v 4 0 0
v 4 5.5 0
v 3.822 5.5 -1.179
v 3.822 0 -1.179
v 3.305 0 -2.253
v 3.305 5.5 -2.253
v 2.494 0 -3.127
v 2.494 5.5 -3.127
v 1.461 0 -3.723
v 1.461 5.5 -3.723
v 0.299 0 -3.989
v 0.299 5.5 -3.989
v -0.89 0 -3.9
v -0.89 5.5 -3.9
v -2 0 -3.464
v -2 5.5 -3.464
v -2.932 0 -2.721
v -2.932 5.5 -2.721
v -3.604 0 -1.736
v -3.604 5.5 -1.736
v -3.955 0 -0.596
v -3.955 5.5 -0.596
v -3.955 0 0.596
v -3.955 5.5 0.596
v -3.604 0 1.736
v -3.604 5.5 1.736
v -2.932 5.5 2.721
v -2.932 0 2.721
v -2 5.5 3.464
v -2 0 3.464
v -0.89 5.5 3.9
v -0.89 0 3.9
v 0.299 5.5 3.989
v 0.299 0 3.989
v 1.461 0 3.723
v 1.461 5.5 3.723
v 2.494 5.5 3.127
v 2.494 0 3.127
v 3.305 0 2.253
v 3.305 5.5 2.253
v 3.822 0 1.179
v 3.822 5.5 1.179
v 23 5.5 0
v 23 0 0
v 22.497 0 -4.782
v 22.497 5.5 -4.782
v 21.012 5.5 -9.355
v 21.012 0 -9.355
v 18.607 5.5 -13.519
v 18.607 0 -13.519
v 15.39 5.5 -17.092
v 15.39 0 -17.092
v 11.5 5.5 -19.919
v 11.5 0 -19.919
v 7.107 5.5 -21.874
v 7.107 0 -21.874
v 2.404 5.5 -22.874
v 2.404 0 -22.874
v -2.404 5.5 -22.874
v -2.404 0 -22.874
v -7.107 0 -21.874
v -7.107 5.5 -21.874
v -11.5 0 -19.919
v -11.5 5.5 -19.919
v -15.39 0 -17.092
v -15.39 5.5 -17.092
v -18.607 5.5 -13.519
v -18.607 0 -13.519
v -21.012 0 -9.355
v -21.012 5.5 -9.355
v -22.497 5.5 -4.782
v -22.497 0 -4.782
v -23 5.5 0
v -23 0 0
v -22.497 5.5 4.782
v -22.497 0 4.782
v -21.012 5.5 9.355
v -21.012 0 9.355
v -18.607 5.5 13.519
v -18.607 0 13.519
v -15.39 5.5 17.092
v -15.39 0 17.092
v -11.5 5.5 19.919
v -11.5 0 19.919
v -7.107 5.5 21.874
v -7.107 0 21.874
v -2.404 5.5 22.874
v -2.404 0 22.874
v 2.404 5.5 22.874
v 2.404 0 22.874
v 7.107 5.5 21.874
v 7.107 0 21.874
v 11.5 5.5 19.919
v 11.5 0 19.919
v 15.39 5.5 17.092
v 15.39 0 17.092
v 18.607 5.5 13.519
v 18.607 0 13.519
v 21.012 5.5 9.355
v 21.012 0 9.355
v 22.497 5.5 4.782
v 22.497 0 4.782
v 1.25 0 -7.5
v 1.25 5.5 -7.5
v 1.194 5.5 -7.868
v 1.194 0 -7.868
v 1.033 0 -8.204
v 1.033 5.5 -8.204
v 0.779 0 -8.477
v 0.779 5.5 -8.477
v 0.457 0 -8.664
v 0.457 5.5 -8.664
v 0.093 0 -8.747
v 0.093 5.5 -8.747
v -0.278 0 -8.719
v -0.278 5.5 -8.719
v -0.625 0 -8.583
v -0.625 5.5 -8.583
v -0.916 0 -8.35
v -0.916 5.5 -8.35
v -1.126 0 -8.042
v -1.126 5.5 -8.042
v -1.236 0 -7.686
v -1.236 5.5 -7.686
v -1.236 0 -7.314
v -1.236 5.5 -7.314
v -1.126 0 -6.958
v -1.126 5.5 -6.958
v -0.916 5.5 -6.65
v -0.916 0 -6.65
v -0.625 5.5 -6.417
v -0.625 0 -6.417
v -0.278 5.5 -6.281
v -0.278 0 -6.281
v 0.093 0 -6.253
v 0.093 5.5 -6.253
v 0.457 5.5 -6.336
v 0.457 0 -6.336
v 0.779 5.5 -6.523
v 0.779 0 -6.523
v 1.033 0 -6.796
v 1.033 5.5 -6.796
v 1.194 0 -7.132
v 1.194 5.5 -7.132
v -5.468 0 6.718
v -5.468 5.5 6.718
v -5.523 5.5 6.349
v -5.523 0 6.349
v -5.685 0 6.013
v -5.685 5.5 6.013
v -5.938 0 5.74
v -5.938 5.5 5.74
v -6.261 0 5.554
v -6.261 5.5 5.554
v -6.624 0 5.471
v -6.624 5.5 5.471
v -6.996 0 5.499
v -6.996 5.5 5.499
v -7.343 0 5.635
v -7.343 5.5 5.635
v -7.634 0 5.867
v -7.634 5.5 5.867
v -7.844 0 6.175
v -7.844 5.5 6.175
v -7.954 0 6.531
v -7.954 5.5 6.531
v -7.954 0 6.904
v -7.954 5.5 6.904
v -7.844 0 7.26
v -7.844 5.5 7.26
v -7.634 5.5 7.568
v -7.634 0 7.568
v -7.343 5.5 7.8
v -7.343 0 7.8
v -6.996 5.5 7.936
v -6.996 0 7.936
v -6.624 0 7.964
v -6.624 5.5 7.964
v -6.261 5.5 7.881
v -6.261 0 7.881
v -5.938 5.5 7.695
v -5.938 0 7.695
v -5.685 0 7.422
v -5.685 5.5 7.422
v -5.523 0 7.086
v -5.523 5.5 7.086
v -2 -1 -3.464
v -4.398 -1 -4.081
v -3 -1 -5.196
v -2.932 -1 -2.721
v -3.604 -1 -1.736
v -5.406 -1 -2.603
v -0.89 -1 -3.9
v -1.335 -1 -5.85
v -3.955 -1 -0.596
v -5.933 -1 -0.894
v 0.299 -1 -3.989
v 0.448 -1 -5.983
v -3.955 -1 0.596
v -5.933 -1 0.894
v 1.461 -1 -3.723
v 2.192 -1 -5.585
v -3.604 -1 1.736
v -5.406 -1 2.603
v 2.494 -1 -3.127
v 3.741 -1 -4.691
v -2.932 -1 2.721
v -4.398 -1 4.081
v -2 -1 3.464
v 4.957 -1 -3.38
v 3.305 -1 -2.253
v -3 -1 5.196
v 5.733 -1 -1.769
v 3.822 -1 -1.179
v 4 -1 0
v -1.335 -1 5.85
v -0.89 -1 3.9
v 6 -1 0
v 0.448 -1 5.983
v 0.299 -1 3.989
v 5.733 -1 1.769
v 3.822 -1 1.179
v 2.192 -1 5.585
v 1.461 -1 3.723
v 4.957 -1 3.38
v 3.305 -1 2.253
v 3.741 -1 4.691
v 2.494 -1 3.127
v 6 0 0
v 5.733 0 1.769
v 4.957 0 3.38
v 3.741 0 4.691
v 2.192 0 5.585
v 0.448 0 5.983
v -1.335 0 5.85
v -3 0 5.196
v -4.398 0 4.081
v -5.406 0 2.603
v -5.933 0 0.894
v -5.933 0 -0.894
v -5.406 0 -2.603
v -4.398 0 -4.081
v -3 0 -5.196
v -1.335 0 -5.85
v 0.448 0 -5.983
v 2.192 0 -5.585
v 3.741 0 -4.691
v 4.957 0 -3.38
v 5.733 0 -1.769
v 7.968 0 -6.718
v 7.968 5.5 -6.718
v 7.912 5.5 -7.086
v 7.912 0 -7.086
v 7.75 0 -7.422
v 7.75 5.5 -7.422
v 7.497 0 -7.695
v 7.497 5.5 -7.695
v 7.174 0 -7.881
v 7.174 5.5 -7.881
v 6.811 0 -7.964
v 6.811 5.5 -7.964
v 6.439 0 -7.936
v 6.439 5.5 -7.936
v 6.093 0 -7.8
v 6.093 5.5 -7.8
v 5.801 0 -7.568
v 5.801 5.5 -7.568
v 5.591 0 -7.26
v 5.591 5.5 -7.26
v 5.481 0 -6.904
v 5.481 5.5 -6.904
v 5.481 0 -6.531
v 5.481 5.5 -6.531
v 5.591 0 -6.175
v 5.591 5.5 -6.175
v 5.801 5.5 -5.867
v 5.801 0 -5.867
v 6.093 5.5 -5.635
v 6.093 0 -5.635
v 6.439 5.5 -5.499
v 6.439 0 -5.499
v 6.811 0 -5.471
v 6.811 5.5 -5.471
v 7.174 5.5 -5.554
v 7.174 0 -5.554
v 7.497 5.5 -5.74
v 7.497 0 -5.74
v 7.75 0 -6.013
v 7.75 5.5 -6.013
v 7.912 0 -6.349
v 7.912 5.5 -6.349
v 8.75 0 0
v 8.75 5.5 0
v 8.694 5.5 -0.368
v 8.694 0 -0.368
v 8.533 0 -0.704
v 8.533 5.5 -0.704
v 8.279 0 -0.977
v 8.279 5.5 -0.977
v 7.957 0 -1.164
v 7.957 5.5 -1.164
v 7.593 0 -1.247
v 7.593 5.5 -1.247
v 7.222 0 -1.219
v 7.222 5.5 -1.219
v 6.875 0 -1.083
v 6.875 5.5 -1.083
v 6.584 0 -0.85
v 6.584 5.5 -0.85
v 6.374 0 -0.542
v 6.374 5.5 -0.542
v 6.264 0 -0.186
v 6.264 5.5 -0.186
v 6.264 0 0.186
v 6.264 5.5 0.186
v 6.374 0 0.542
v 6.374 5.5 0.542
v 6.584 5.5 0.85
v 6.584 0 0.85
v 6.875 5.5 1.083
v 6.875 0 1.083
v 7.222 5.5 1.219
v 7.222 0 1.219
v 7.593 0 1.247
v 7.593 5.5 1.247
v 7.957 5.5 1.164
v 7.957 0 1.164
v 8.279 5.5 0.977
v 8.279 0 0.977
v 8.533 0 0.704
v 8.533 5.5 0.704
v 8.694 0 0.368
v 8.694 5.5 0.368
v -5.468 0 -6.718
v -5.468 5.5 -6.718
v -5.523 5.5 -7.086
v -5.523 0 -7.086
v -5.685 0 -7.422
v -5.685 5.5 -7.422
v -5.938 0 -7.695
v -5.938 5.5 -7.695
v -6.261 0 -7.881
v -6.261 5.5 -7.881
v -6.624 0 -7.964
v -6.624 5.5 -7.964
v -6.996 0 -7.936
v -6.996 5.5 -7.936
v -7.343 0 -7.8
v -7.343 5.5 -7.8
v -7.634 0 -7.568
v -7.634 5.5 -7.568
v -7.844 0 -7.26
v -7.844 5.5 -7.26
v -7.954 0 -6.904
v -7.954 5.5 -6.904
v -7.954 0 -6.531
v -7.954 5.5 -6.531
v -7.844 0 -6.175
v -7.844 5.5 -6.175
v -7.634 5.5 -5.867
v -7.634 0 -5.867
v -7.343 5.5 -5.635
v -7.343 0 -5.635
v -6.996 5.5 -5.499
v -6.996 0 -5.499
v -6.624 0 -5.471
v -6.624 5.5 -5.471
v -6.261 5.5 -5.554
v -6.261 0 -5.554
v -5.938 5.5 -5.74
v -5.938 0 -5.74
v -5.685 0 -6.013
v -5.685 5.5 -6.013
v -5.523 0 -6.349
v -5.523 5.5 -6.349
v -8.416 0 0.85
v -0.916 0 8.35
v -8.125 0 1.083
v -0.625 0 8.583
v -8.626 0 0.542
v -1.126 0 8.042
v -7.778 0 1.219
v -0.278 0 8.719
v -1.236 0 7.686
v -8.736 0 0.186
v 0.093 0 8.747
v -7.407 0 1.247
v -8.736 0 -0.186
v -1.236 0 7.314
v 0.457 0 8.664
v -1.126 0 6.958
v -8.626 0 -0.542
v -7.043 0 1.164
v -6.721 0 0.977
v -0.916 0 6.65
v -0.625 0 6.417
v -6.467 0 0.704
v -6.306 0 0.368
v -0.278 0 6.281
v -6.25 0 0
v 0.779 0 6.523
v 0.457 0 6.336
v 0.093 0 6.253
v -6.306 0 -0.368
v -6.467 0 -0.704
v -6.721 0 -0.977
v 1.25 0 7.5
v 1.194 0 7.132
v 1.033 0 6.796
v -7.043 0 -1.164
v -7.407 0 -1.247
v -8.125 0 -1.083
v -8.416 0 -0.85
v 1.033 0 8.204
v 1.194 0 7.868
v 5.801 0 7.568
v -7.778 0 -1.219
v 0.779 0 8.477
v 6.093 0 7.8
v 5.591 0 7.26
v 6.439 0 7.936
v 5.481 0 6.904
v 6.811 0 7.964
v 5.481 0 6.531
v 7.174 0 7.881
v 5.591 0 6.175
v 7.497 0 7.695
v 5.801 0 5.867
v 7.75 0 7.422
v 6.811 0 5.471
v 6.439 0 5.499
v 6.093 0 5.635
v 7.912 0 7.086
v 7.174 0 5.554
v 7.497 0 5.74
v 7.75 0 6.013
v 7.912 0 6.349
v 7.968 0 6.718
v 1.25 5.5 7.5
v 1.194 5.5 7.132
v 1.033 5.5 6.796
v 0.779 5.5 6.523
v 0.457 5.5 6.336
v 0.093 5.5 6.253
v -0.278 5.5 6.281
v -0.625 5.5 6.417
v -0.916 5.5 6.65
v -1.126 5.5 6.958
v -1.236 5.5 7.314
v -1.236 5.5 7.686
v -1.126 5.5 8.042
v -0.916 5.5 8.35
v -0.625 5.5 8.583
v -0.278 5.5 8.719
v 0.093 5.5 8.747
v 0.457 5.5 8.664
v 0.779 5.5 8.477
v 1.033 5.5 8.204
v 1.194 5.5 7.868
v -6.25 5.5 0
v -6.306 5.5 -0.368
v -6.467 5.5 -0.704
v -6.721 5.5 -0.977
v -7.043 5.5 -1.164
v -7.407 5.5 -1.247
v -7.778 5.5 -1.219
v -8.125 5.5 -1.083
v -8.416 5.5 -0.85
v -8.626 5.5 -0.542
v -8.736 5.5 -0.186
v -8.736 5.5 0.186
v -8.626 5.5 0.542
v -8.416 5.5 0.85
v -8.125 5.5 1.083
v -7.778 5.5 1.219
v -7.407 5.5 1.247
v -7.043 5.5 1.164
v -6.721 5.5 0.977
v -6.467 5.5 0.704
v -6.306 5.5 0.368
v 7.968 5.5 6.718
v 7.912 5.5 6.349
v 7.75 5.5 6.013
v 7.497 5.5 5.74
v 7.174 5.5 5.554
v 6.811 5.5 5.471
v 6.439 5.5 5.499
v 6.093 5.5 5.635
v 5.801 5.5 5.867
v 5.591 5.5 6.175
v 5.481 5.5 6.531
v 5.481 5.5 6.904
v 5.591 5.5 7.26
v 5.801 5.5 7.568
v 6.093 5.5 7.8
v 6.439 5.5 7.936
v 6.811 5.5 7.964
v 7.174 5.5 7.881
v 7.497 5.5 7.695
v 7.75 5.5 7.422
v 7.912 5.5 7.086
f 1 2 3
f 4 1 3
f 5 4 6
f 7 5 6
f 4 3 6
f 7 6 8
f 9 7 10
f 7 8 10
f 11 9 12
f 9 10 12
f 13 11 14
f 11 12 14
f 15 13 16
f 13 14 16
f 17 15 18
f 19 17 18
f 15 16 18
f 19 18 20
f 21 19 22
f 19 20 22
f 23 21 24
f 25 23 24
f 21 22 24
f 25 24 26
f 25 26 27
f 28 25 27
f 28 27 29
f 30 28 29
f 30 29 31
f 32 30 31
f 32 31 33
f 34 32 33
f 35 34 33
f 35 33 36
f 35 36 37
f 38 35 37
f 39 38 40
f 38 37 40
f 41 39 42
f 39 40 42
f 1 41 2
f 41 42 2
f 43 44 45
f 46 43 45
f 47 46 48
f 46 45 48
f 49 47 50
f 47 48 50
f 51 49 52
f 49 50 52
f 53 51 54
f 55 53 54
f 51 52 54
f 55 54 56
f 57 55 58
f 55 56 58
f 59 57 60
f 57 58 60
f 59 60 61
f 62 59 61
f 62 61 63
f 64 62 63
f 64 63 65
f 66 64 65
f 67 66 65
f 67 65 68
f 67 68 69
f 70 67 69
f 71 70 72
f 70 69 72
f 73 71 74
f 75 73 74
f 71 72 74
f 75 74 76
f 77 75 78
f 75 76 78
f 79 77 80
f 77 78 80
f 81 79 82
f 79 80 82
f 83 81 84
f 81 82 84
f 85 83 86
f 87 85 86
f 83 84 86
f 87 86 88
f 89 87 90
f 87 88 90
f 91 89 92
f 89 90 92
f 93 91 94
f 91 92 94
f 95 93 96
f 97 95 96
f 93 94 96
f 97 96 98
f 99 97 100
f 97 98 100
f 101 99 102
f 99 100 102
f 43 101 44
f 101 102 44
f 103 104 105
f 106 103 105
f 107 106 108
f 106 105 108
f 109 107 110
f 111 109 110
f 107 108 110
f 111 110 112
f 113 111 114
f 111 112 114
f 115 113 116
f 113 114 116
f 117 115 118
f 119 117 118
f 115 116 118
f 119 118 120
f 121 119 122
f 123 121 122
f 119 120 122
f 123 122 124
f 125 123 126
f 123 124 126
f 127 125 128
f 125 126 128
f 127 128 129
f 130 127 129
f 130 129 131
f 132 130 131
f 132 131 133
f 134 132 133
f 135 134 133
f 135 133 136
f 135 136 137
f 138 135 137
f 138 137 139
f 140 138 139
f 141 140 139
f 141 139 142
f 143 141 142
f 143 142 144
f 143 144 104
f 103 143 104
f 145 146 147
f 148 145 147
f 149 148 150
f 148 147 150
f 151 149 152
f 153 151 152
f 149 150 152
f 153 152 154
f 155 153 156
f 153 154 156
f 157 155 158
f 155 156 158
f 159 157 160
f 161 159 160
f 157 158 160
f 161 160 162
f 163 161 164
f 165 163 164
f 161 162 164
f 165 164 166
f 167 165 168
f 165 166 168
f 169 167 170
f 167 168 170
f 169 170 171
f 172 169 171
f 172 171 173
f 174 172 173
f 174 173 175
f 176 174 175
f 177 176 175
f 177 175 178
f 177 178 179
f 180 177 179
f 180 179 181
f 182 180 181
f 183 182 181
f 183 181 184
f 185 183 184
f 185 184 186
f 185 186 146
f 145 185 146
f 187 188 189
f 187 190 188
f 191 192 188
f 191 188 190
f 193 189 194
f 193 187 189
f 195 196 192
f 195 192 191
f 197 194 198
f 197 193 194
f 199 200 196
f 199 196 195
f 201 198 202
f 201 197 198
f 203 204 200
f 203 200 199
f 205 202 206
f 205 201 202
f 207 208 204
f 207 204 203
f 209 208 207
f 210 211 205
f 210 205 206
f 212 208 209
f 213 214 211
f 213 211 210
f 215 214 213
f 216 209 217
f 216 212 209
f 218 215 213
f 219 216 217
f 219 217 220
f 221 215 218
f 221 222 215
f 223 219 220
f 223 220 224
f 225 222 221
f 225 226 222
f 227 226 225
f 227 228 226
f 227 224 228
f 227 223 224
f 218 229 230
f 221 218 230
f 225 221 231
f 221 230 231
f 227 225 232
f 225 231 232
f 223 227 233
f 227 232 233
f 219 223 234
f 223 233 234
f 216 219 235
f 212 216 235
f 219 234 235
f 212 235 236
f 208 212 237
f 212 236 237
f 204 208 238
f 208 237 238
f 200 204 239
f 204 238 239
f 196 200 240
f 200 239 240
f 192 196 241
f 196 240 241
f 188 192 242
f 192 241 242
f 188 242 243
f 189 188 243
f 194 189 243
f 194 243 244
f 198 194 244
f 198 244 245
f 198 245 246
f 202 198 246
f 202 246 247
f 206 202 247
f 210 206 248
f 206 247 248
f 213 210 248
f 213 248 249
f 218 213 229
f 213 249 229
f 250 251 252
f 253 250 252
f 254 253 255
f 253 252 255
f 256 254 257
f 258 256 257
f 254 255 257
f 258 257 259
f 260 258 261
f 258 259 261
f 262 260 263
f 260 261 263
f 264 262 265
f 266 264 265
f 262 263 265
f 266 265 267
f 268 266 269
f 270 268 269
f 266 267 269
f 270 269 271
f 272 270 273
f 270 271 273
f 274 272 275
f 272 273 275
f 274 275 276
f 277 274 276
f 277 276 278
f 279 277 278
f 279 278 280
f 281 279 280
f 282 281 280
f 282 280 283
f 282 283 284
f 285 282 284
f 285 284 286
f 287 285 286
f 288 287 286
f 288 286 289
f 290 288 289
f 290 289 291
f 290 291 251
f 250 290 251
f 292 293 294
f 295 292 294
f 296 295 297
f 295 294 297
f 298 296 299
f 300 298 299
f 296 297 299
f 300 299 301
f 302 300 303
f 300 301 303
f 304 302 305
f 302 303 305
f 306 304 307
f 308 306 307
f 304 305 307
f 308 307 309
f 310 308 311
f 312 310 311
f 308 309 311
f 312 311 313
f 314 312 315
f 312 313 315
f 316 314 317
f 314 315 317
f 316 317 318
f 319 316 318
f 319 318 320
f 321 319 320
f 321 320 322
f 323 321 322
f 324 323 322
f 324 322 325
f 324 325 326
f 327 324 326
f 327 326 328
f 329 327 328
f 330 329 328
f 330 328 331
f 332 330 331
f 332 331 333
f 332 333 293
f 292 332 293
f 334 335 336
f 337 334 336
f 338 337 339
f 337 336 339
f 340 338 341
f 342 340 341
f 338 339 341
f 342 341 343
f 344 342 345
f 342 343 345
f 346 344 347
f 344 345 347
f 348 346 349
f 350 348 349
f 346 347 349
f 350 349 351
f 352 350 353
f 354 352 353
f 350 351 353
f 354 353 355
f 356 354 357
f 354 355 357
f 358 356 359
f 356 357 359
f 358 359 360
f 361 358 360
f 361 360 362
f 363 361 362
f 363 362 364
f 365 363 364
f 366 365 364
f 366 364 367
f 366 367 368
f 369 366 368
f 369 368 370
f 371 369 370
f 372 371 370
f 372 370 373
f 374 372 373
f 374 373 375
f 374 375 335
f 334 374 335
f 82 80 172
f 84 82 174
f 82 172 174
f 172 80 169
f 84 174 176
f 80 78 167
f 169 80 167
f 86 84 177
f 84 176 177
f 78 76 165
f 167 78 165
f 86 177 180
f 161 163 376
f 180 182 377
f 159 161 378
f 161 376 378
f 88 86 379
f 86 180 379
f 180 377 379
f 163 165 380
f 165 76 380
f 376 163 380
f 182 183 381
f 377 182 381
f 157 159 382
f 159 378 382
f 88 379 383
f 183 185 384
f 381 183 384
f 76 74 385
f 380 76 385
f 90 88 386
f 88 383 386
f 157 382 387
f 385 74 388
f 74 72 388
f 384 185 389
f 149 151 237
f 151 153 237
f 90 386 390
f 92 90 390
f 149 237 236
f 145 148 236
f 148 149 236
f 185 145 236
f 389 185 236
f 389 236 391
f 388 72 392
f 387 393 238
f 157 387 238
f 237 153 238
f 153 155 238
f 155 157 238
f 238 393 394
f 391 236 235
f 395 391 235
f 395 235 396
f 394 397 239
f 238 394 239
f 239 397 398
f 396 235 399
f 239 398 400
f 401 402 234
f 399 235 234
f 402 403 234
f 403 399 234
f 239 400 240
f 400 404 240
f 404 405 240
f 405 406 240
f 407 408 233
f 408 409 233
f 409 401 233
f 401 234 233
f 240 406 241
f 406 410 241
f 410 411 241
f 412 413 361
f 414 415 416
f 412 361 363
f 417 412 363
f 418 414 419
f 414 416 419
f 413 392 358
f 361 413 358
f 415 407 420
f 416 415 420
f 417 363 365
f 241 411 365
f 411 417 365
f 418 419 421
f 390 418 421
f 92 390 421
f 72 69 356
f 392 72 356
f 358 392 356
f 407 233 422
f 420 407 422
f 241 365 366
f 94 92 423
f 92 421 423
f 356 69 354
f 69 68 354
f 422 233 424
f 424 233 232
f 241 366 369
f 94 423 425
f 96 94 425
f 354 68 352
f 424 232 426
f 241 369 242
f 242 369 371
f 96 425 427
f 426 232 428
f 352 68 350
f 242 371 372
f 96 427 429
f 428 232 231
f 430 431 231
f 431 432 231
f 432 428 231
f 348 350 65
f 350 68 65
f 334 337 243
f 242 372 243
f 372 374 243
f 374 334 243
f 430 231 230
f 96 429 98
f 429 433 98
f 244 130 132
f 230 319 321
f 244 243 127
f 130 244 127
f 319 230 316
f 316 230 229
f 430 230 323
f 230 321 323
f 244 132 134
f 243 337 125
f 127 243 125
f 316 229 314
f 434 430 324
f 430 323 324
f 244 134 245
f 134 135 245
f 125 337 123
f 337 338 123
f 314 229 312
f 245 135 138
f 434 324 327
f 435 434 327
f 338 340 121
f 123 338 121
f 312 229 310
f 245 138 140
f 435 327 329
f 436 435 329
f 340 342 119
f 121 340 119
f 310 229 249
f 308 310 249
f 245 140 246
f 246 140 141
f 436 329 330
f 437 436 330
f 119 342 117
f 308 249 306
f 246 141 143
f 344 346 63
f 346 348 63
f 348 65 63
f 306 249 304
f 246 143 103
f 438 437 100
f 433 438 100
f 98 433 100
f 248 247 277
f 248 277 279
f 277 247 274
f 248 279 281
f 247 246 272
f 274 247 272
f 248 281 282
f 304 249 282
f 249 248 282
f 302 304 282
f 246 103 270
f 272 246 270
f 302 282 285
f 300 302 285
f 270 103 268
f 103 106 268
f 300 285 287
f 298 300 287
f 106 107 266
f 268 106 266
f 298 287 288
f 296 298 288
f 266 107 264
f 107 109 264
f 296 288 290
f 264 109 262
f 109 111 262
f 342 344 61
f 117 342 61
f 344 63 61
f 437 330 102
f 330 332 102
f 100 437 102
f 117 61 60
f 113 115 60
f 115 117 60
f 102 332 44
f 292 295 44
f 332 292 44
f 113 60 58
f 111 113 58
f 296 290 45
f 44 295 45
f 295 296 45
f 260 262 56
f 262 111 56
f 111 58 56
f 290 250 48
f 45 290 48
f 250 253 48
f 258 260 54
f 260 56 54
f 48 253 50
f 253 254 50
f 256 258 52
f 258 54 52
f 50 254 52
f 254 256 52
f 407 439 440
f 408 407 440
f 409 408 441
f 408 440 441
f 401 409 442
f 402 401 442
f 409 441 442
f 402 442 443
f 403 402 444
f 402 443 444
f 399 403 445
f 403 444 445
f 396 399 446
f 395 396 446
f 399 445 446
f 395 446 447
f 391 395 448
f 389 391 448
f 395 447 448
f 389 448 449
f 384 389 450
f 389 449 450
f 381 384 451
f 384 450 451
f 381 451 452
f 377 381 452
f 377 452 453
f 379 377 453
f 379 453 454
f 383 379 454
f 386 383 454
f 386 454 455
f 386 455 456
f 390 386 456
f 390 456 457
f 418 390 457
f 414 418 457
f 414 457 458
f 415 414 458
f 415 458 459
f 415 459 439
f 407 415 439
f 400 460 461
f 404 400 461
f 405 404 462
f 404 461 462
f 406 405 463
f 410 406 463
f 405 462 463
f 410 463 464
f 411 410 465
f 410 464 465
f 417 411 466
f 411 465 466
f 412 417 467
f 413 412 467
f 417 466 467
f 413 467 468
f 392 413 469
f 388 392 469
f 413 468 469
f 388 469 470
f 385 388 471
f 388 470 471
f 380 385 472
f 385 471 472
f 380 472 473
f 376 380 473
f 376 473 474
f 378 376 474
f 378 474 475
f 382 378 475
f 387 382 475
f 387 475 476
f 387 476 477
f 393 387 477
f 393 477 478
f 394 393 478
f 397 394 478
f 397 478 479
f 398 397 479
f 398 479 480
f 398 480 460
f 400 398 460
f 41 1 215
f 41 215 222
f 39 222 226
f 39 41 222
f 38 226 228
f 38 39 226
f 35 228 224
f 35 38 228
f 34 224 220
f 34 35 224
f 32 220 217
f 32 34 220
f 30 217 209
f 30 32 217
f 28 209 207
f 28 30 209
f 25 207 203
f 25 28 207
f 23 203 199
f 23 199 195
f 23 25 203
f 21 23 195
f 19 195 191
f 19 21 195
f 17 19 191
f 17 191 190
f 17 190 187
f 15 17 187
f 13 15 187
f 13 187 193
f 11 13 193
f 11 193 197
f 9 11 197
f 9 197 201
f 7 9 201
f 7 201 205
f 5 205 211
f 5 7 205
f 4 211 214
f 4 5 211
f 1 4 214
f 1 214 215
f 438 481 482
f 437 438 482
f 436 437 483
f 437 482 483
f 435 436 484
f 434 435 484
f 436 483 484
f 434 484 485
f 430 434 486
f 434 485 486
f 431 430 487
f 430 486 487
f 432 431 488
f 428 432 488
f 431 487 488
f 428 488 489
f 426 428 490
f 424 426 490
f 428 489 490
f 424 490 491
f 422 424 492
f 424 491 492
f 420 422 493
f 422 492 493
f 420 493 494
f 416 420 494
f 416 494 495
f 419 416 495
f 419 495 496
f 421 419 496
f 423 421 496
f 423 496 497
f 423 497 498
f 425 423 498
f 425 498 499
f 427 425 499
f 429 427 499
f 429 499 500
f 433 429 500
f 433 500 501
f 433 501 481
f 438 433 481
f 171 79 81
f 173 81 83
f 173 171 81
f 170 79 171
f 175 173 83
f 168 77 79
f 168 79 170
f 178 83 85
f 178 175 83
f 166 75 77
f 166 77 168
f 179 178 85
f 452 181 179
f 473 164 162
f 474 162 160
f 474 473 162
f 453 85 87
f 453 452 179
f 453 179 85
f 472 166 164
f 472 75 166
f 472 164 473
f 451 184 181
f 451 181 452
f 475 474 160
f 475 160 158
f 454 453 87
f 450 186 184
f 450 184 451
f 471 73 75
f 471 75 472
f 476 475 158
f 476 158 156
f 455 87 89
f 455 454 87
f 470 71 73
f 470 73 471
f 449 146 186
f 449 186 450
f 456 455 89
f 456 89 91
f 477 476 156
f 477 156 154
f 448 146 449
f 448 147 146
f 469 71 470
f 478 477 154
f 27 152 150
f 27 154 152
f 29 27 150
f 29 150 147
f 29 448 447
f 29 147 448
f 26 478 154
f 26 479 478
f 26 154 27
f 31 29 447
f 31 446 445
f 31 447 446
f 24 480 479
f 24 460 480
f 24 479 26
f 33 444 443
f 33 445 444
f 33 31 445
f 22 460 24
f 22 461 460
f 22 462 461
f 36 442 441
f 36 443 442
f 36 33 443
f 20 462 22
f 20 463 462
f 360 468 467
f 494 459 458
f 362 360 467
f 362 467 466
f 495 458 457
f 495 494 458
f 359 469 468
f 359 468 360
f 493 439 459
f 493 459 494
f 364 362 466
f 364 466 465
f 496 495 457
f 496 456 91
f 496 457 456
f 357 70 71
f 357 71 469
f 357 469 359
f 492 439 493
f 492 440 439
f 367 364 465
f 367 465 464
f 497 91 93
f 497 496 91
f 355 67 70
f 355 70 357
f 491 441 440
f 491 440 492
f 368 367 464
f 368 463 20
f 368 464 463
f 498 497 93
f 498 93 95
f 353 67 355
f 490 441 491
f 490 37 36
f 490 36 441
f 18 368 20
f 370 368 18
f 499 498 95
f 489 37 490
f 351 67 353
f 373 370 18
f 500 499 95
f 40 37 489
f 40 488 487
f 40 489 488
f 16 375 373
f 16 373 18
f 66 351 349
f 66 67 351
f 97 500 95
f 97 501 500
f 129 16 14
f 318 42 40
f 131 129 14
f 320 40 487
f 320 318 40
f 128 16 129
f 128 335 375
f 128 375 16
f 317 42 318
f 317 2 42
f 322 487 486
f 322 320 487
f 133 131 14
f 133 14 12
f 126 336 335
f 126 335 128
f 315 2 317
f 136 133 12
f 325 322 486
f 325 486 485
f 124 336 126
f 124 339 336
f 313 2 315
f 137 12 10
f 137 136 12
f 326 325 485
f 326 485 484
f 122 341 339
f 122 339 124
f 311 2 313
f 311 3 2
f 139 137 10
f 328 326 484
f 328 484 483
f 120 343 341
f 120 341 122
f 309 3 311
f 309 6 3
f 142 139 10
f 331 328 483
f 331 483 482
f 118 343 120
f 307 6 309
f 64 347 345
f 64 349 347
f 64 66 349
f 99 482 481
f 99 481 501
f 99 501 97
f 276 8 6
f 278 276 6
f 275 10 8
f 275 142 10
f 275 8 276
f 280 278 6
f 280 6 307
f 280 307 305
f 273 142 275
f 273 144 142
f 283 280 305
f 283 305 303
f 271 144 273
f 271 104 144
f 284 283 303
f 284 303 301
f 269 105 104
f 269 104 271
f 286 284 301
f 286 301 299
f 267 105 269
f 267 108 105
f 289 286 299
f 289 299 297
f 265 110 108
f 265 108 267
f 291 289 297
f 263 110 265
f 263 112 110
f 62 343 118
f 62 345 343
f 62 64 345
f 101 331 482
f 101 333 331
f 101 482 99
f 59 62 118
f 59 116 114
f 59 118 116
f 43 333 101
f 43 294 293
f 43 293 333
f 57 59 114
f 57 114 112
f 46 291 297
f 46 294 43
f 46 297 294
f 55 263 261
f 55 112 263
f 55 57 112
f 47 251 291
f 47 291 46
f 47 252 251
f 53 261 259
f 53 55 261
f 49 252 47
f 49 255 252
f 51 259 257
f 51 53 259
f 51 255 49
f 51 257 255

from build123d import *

# Parameters (mm, degrees)
SKETCH1_R                 = 23
BOSS_EXTRUDE1_DEPTH       = 5.5
SKETCH2_R                 = 4
CUT_EXTRUDE1_DEPTH        = 5.5
M3X0_5_TAPPED_HOLE1_D     = 2.5
M3X0_5_TAPPED_HOLE1_DEPTH = 6.5
M3X0_5_TAPPED_HOLE1_TIP   = 0.751075774
SKETCH6_R                 = 6
SKETCH6_R_2               = 4
BOSS_EXTRUDE2_DEPTH       = 1


with BuildPart() as part:
    # Sketch1 → Boss-Extrude1 (new body)
    with BuildSketch(Plane(origin=(0, 0, 0), x_dir=(1, 0, 0), z_dir=(0, 1, 0))):
        Circle(SKETCH1_R)
    extrude(amount=BOSS_EXTRUDE1_DEPTH)

    # Sketch2 → Cut-Extrude1 (cut)
    with BuildSketch(Plane(origin=(0, 5.5, 0), x_dir=(1, 0, 0), z_dir=(0, 1, 0))):
        Circle(SKETCH2_R)
    extrude(amount=-CUT_EXTRUDE1_DEPTH, mode=Mode.SUBTRACT)

    # M3x0.5 Tapped Hole1
    with Locations(Plane(origin=(0, 0, 0), x_dir=(-1, 0, 0), z_dir=(0, -1, 0))):
        with Locations((6.717514421, -6.717514421), (-7.5, 0), (0, 7.5), (7.5, 0), (0, -7.5), (-6.717514421, -6.717514421), (-6.717514421, 6.717514421), (6.717514421, 6.717514421)):
            Hole(M3X0_5_TAPPED_HOLE1_D / 2, depth=M3X0_5_TAPPED_HOLE1_DEPTH)
            with Locations((0, 0, -(M3X0_5_TAPPED_HOLE1_DEPTH + M3X0_5_TAPPED_HOLE1_TIP / 2))):  # 118° drill point
                Cone(0, M3X0_5_TAPPED_HOLE1_D / 2, M3X0_5_TAPPED_HOLE1_TIP, mode=Mode.SUBTRACT)

    # Sketch6 → Boss-Extrude2 (add)
    with BuildSketch(Plane.XZ):
        Circle(SKETCH6_R)
        Circle(SKETCH6_R_2, mode=Mode.SUBTRACT)
    extrude(amount=BOSS_EXTRUDE2_DEPTH)


solid = part.part
